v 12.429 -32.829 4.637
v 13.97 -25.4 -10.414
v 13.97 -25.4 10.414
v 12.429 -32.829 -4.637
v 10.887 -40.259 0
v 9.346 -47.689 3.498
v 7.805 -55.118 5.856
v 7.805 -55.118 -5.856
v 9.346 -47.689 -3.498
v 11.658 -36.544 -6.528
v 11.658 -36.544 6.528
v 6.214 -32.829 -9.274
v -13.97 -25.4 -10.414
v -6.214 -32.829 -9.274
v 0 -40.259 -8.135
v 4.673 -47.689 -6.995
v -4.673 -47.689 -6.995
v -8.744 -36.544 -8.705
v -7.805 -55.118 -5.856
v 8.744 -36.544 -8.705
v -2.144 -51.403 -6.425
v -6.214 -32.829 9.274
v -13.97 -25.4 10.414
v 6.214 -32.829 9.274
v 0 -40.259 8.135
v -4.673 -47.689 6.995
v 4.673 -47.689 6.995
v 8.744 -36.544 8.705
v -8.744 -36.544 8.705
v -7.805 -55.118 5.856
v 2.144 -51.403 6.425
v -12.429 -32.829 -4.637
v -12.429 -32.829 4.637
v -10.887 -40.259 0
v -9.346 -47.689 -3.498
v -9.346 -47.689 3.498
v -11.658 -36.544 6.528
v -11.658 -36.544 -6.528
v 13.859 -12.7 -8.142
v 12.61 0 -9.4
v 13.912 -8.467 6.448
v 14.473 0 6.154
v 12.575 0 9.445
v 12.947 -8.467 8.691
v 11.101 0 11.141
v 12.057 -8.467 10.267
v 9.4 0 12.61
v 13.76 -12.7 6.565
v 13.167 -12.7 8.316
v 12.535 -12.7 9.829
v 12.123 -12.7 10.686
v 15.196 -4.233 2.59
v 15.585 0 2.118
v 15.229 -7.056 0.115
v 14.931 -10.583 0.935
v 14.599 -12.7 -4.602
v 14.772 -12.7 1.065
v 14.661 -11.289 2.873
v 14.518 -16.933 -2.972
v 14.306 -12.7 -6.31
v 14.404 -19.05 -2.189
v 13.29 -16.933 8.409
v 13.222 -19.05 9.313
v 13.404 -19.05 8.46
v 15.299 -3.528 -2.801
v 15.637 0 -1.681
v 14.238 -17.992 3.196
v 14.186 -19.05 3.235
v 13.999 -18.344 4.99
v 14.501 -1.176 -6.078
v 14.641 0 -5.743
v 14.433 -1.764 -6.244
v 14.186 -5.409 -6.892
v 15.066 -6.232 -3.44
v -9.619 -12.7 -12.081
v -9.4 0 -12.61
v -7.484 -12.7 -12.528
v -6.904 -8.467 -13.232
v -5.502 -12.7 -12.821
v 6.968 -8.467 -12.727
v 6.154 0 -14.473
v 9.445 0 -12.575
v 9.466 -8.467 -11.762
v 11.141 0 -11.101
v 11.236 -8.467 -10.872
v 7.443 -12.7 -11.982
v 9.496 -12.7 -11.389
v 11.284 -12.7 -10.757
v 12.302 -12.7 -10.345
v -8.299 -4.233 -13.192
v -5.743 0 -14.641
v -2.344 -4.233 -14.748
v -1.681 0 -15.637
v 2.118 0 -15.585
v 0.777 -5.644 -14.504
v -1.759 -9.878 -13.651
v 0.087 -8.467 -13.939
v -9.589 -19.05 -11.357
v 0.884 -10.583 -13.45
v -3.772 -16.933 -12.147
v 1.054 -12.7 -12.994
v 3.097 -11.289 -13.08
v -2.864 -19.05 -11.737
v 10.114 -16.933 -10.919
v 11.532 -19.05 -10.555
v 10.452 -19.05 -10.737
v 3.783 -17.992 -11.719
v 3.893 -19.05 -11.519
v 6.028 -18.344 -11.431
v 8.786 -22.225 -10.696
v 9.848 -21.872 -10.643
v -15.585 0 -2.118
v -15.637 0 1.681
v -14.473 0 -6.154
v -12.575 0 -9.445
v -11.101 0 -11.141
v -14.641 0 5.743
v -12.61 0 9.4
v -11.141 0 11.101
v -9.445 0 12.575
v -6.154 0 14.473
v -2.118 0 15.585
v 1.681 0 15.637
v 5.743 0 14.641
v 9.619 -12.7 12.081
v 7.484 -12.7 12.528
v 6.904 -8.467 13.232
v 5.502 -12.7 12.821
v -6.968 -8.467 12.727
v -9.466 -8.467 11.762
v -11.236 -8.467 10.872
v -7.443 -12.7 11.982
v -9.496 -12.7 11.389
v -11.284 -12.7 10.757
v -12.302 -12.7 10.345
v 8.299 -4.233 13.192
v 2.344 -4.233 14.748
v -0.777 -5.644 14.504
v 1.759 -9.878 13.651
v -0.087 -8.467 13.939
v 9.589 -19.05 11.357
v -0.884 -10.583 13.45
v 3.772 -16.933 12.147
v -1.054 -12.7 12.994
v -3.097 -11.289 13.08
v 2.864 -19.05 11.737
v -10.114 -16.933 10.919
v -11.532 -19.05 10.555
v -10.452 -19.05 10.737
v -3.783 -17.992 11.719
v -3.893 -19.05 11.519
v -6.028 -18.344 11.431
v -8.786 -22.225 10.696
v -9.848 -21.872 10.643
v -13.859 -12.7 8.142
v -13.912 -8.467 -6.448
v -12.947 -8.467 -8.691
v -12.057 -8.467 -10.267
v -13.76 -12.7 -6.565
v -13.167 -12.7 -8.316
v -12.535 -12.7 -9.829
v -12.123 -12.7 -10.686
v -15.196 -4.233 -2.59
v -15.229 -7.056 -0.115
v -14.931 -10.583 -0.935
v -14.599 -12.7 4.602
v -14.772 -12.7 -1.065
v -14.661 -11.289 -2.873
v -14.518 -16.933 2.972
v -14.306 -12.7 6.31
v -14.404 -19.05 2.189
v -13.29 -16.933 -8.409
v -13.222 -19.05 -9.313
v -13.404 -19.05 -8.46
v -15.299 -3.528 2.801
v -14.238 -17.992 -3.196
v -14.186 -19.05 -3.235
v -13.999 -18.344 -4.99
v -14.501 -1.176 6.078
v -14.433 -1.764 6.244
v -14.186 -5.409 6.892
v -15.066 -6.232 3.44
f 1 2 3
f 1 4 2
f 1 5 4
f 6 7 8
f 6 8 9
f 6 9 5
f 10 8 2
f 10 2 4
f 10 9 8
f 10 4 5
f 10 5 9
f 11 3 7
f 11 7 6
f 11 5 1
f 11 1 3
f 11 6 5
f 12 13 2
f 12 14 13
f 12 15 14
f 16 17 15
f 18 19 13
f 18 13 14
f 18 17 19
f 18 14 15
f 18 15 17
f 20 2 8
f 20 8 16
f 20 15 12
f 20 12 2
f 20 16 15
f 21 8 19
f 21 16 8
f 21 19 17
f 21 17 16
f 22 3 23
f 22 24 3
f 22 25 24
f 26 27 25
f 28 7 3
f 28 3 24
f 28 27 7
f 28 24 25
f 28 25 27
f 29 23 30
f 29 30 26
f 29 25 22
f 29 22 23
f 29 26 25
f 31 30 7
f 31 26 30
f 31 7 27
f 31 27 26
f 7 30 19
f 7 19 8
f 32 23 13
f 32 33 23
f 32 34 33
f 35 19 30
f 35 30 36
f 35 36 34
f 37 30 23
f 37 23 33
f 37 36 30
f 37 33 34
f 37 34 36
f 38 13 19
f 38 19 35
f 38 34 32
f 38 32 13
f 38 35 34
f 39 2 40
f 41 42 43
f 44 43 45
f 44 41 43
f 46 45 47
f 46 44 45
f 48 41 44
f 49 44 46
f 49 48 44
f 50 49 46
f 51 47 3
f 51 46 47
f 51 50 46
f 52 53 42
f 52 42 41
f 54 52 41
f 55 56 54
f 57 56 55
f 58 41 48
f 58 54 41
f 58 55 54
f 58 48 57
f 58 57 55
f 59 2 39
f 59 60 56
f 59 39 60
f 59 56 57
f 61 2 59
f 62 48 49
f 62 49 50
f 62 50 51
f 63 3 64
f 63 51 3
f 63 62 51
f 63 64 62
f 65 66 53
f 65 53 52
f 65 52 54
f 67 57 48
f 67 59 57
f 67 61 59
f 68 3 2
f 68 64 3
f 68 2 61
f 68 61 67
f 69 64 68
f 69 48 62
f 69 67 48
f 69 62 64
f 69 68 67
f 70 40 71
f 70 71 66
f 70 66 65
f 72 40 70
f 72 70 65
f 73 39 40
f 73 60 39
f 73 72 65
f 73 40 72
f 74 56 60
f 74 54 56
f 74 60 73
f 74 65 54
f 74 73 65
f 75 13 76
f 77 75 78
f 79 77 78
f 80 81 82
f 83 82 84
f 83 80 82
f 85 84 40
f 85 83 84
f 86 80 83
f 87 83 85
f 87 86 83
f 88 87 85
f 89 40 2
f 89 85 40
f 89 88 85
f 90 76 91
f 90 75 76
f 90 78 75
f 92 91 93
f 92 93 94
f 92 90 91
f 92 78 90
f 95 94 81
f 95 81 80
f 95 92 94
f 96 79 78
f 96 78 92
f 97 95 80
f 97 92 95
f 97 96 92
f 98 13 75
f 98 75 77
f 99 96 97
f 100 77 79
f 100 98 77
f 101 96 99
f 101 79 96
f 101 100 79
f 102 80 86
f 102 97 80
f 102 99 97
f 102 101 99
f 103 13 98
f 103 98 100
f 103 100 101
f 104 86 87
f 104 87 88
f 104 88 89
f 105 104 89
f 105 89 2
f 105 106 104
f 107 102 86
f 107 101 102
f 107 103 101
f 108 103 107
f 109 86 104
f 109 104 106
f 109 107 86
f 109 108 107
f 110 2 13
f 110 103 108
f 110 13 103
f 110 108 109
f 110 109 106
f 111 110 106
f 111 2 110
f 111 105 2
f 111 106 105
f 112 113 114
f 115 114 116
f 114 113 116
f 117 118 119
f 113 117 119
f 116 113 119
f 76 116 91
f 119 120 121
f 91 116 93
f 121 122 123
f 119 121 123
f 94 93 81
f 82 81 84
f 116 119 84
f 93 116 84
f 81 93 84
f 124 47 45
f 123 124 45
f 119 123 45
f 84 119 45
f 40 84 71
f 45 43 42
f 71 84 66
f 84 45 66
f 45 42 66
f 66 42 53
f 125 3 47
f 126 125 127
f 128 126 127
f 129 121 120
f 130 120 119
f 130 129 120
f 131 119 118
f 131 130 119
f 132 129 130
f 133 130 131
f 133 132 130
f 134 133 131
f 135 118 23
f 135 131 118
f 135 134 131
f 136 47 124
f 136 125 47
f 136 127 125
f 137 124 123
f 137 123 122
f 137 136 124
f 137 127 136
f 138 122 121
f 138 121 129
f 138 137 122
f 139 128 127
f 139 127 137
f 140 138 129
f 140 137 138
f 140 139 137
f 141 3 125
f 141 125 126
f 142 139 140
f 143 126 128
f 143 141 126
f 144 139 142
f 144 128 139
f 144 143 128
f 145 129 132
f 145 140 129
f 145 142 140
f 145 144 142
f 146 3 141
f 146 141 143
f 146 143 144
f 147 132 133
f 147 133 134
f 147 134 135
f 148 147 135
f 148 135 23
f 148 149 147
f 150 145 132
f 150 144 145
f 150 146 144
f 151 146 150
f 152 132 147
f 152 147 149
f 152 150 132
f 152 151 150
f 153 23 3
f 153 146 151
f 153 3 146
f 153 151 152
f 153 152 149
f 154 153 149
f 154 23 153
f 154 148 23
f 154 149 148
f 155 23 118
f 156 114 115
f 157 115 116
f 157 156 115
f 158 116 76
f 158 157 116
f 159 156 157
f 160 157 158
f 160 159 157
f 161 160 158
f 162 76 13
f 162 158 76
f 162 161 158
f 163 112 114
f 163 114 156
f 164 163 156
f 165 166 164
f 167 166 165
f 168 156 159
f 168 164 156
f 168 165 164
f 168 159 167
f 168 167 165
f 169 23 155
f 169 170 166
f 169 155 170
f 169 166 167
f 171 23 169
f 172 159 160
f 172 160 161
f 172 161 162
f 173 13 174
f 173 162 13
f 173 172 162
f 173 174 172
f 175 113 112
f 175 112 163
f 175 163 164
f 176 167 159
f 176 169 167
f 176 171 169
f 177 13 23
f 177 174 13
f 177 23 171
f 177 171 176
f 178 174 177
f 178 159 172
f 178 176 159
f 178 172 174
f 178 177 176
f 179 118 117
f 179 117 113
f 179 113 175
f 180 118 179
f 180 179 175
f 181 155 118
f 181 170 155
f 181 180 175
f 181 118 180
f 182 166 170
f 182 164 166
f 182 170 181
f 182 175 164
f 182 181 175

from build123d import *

# Parameters (mm, degrees)
F2_W      = 27.9399994761
F2_H      = 20.8280012012
F3_FACE_W = 27.9399994761
F3_FACE_H = 20.8280012012
F5_W      = 15.6096592546
F5_H      = 11.7110861465


# Not quite as in the source:
# - the arcs of a loft's sections are written as splines that run evenly, so that the points pair up as in the source's solid


with BuildPart() as f3:
    # F0 (on Front) → F3 section 0
    with BuildSketch(Plane.XZ):
        with BuildLine():
            add(Edge.make_bspline(
                [(-12.6098715409, 9.4000867761), (-13.8403400225, 7.7494584513), (-14.7421231636, 5.8548204804), (-15.7523962289, 1.8630972263), (-15.8604886539, -0.2324174842), (-15.2662929053, -4.3069036624), (-14.5642385224, -6.2842719937), (-12.4560348761, -9.8212175107), (-11.050715101, -11.3794030593), (-9.4000867761, -12.6098715409)],
                knots=[0, 0, 0, 0, 0.25, 0.25, 0.5, 0.5, 0.75, 0.75, 1, 1, 1, 1], degree=3))
            add(Edge.make_bspline(
                [(-9.4000867761, -12.6098715409), (-7.7494584513, -13.8403400225), (-5.8548204804, -14.7421231636), (-1.8630972263, -15.7523962289), (0.2324174842, -15.8604886539), (4.3069036624, -15.2662929053), (6.2842719937, -14.5642385224), (9.8212175107, -12.4560348761), (11.3794030593, -11.050715101), (12.6098715409, -9.4000867761)],
                knots=[0, 0, 0, 0, 0.25, 0.25, 0.5, 0.5, 0.75, 0.75, 1, 1, 1, 1], degree=3))
            add(Edge.make_bspline(
                [(12.6098715409, -9.4000867761), (13.8403400225, -7.7494584513), (14.7421231636, -5.8548204804), (15.7523962289, -1.8630972263), (15.8604886539, 0.2324174842), (15.2662929053, 4.3069036624), (14.5642385224, 6.2842719937), (12.4560348761, 9.8212175107), (11.050715101, 11.3794030593), (9.4000867761, 12.6098715409)],
                knots=[0, 0, 0, 0, 0.25, 0.25, 0.5, 0.5, 0.75, 0.75, 1, 1, 1, 1], degree=3))
            add(Edge.make_bspline(
                [(9.4000867761, 12.6098715409), (7.7494584513, 13.8403400225), (5.8548204804, 14.7421231636), (1.8630972263, 15.7523962289), (-0.2324174842, 15.8604886539), (-4.3069036624, 15.2662929053), (-6.2842719937, 14.5642385224), (-9.8212175107, 12.4560348761), (-11.3794030593, 11.050715101), (-12.6098715409, 9.4000867761)],
                knots=[0, 0, 0, 0, 0.25, 0.25, 0.5, 0.5, 0.75, 0.75, 1, 1, 1, 1], degree=3))
        make_face()
    # F2 (on offset) → F3 section 1
    with BuildSketch(Plane.XZ.offset(25.4)):
        Rectangle(F2_W, F2_H)
    loft(ruled=True)

    # F3_face (on face) → F6 section 0
    with BuildSketch(Plane.XZ.offset(25.4)):
        Rectangle(F3_FACE_W, F3_FACE_H)
    # F5 (on offset) → F6 section 1
    with BuildSketch(Plane.XZ.offset(55.118)):
        Rectangle(F5_W, F5_H)
    loft()


solid = f3.part
